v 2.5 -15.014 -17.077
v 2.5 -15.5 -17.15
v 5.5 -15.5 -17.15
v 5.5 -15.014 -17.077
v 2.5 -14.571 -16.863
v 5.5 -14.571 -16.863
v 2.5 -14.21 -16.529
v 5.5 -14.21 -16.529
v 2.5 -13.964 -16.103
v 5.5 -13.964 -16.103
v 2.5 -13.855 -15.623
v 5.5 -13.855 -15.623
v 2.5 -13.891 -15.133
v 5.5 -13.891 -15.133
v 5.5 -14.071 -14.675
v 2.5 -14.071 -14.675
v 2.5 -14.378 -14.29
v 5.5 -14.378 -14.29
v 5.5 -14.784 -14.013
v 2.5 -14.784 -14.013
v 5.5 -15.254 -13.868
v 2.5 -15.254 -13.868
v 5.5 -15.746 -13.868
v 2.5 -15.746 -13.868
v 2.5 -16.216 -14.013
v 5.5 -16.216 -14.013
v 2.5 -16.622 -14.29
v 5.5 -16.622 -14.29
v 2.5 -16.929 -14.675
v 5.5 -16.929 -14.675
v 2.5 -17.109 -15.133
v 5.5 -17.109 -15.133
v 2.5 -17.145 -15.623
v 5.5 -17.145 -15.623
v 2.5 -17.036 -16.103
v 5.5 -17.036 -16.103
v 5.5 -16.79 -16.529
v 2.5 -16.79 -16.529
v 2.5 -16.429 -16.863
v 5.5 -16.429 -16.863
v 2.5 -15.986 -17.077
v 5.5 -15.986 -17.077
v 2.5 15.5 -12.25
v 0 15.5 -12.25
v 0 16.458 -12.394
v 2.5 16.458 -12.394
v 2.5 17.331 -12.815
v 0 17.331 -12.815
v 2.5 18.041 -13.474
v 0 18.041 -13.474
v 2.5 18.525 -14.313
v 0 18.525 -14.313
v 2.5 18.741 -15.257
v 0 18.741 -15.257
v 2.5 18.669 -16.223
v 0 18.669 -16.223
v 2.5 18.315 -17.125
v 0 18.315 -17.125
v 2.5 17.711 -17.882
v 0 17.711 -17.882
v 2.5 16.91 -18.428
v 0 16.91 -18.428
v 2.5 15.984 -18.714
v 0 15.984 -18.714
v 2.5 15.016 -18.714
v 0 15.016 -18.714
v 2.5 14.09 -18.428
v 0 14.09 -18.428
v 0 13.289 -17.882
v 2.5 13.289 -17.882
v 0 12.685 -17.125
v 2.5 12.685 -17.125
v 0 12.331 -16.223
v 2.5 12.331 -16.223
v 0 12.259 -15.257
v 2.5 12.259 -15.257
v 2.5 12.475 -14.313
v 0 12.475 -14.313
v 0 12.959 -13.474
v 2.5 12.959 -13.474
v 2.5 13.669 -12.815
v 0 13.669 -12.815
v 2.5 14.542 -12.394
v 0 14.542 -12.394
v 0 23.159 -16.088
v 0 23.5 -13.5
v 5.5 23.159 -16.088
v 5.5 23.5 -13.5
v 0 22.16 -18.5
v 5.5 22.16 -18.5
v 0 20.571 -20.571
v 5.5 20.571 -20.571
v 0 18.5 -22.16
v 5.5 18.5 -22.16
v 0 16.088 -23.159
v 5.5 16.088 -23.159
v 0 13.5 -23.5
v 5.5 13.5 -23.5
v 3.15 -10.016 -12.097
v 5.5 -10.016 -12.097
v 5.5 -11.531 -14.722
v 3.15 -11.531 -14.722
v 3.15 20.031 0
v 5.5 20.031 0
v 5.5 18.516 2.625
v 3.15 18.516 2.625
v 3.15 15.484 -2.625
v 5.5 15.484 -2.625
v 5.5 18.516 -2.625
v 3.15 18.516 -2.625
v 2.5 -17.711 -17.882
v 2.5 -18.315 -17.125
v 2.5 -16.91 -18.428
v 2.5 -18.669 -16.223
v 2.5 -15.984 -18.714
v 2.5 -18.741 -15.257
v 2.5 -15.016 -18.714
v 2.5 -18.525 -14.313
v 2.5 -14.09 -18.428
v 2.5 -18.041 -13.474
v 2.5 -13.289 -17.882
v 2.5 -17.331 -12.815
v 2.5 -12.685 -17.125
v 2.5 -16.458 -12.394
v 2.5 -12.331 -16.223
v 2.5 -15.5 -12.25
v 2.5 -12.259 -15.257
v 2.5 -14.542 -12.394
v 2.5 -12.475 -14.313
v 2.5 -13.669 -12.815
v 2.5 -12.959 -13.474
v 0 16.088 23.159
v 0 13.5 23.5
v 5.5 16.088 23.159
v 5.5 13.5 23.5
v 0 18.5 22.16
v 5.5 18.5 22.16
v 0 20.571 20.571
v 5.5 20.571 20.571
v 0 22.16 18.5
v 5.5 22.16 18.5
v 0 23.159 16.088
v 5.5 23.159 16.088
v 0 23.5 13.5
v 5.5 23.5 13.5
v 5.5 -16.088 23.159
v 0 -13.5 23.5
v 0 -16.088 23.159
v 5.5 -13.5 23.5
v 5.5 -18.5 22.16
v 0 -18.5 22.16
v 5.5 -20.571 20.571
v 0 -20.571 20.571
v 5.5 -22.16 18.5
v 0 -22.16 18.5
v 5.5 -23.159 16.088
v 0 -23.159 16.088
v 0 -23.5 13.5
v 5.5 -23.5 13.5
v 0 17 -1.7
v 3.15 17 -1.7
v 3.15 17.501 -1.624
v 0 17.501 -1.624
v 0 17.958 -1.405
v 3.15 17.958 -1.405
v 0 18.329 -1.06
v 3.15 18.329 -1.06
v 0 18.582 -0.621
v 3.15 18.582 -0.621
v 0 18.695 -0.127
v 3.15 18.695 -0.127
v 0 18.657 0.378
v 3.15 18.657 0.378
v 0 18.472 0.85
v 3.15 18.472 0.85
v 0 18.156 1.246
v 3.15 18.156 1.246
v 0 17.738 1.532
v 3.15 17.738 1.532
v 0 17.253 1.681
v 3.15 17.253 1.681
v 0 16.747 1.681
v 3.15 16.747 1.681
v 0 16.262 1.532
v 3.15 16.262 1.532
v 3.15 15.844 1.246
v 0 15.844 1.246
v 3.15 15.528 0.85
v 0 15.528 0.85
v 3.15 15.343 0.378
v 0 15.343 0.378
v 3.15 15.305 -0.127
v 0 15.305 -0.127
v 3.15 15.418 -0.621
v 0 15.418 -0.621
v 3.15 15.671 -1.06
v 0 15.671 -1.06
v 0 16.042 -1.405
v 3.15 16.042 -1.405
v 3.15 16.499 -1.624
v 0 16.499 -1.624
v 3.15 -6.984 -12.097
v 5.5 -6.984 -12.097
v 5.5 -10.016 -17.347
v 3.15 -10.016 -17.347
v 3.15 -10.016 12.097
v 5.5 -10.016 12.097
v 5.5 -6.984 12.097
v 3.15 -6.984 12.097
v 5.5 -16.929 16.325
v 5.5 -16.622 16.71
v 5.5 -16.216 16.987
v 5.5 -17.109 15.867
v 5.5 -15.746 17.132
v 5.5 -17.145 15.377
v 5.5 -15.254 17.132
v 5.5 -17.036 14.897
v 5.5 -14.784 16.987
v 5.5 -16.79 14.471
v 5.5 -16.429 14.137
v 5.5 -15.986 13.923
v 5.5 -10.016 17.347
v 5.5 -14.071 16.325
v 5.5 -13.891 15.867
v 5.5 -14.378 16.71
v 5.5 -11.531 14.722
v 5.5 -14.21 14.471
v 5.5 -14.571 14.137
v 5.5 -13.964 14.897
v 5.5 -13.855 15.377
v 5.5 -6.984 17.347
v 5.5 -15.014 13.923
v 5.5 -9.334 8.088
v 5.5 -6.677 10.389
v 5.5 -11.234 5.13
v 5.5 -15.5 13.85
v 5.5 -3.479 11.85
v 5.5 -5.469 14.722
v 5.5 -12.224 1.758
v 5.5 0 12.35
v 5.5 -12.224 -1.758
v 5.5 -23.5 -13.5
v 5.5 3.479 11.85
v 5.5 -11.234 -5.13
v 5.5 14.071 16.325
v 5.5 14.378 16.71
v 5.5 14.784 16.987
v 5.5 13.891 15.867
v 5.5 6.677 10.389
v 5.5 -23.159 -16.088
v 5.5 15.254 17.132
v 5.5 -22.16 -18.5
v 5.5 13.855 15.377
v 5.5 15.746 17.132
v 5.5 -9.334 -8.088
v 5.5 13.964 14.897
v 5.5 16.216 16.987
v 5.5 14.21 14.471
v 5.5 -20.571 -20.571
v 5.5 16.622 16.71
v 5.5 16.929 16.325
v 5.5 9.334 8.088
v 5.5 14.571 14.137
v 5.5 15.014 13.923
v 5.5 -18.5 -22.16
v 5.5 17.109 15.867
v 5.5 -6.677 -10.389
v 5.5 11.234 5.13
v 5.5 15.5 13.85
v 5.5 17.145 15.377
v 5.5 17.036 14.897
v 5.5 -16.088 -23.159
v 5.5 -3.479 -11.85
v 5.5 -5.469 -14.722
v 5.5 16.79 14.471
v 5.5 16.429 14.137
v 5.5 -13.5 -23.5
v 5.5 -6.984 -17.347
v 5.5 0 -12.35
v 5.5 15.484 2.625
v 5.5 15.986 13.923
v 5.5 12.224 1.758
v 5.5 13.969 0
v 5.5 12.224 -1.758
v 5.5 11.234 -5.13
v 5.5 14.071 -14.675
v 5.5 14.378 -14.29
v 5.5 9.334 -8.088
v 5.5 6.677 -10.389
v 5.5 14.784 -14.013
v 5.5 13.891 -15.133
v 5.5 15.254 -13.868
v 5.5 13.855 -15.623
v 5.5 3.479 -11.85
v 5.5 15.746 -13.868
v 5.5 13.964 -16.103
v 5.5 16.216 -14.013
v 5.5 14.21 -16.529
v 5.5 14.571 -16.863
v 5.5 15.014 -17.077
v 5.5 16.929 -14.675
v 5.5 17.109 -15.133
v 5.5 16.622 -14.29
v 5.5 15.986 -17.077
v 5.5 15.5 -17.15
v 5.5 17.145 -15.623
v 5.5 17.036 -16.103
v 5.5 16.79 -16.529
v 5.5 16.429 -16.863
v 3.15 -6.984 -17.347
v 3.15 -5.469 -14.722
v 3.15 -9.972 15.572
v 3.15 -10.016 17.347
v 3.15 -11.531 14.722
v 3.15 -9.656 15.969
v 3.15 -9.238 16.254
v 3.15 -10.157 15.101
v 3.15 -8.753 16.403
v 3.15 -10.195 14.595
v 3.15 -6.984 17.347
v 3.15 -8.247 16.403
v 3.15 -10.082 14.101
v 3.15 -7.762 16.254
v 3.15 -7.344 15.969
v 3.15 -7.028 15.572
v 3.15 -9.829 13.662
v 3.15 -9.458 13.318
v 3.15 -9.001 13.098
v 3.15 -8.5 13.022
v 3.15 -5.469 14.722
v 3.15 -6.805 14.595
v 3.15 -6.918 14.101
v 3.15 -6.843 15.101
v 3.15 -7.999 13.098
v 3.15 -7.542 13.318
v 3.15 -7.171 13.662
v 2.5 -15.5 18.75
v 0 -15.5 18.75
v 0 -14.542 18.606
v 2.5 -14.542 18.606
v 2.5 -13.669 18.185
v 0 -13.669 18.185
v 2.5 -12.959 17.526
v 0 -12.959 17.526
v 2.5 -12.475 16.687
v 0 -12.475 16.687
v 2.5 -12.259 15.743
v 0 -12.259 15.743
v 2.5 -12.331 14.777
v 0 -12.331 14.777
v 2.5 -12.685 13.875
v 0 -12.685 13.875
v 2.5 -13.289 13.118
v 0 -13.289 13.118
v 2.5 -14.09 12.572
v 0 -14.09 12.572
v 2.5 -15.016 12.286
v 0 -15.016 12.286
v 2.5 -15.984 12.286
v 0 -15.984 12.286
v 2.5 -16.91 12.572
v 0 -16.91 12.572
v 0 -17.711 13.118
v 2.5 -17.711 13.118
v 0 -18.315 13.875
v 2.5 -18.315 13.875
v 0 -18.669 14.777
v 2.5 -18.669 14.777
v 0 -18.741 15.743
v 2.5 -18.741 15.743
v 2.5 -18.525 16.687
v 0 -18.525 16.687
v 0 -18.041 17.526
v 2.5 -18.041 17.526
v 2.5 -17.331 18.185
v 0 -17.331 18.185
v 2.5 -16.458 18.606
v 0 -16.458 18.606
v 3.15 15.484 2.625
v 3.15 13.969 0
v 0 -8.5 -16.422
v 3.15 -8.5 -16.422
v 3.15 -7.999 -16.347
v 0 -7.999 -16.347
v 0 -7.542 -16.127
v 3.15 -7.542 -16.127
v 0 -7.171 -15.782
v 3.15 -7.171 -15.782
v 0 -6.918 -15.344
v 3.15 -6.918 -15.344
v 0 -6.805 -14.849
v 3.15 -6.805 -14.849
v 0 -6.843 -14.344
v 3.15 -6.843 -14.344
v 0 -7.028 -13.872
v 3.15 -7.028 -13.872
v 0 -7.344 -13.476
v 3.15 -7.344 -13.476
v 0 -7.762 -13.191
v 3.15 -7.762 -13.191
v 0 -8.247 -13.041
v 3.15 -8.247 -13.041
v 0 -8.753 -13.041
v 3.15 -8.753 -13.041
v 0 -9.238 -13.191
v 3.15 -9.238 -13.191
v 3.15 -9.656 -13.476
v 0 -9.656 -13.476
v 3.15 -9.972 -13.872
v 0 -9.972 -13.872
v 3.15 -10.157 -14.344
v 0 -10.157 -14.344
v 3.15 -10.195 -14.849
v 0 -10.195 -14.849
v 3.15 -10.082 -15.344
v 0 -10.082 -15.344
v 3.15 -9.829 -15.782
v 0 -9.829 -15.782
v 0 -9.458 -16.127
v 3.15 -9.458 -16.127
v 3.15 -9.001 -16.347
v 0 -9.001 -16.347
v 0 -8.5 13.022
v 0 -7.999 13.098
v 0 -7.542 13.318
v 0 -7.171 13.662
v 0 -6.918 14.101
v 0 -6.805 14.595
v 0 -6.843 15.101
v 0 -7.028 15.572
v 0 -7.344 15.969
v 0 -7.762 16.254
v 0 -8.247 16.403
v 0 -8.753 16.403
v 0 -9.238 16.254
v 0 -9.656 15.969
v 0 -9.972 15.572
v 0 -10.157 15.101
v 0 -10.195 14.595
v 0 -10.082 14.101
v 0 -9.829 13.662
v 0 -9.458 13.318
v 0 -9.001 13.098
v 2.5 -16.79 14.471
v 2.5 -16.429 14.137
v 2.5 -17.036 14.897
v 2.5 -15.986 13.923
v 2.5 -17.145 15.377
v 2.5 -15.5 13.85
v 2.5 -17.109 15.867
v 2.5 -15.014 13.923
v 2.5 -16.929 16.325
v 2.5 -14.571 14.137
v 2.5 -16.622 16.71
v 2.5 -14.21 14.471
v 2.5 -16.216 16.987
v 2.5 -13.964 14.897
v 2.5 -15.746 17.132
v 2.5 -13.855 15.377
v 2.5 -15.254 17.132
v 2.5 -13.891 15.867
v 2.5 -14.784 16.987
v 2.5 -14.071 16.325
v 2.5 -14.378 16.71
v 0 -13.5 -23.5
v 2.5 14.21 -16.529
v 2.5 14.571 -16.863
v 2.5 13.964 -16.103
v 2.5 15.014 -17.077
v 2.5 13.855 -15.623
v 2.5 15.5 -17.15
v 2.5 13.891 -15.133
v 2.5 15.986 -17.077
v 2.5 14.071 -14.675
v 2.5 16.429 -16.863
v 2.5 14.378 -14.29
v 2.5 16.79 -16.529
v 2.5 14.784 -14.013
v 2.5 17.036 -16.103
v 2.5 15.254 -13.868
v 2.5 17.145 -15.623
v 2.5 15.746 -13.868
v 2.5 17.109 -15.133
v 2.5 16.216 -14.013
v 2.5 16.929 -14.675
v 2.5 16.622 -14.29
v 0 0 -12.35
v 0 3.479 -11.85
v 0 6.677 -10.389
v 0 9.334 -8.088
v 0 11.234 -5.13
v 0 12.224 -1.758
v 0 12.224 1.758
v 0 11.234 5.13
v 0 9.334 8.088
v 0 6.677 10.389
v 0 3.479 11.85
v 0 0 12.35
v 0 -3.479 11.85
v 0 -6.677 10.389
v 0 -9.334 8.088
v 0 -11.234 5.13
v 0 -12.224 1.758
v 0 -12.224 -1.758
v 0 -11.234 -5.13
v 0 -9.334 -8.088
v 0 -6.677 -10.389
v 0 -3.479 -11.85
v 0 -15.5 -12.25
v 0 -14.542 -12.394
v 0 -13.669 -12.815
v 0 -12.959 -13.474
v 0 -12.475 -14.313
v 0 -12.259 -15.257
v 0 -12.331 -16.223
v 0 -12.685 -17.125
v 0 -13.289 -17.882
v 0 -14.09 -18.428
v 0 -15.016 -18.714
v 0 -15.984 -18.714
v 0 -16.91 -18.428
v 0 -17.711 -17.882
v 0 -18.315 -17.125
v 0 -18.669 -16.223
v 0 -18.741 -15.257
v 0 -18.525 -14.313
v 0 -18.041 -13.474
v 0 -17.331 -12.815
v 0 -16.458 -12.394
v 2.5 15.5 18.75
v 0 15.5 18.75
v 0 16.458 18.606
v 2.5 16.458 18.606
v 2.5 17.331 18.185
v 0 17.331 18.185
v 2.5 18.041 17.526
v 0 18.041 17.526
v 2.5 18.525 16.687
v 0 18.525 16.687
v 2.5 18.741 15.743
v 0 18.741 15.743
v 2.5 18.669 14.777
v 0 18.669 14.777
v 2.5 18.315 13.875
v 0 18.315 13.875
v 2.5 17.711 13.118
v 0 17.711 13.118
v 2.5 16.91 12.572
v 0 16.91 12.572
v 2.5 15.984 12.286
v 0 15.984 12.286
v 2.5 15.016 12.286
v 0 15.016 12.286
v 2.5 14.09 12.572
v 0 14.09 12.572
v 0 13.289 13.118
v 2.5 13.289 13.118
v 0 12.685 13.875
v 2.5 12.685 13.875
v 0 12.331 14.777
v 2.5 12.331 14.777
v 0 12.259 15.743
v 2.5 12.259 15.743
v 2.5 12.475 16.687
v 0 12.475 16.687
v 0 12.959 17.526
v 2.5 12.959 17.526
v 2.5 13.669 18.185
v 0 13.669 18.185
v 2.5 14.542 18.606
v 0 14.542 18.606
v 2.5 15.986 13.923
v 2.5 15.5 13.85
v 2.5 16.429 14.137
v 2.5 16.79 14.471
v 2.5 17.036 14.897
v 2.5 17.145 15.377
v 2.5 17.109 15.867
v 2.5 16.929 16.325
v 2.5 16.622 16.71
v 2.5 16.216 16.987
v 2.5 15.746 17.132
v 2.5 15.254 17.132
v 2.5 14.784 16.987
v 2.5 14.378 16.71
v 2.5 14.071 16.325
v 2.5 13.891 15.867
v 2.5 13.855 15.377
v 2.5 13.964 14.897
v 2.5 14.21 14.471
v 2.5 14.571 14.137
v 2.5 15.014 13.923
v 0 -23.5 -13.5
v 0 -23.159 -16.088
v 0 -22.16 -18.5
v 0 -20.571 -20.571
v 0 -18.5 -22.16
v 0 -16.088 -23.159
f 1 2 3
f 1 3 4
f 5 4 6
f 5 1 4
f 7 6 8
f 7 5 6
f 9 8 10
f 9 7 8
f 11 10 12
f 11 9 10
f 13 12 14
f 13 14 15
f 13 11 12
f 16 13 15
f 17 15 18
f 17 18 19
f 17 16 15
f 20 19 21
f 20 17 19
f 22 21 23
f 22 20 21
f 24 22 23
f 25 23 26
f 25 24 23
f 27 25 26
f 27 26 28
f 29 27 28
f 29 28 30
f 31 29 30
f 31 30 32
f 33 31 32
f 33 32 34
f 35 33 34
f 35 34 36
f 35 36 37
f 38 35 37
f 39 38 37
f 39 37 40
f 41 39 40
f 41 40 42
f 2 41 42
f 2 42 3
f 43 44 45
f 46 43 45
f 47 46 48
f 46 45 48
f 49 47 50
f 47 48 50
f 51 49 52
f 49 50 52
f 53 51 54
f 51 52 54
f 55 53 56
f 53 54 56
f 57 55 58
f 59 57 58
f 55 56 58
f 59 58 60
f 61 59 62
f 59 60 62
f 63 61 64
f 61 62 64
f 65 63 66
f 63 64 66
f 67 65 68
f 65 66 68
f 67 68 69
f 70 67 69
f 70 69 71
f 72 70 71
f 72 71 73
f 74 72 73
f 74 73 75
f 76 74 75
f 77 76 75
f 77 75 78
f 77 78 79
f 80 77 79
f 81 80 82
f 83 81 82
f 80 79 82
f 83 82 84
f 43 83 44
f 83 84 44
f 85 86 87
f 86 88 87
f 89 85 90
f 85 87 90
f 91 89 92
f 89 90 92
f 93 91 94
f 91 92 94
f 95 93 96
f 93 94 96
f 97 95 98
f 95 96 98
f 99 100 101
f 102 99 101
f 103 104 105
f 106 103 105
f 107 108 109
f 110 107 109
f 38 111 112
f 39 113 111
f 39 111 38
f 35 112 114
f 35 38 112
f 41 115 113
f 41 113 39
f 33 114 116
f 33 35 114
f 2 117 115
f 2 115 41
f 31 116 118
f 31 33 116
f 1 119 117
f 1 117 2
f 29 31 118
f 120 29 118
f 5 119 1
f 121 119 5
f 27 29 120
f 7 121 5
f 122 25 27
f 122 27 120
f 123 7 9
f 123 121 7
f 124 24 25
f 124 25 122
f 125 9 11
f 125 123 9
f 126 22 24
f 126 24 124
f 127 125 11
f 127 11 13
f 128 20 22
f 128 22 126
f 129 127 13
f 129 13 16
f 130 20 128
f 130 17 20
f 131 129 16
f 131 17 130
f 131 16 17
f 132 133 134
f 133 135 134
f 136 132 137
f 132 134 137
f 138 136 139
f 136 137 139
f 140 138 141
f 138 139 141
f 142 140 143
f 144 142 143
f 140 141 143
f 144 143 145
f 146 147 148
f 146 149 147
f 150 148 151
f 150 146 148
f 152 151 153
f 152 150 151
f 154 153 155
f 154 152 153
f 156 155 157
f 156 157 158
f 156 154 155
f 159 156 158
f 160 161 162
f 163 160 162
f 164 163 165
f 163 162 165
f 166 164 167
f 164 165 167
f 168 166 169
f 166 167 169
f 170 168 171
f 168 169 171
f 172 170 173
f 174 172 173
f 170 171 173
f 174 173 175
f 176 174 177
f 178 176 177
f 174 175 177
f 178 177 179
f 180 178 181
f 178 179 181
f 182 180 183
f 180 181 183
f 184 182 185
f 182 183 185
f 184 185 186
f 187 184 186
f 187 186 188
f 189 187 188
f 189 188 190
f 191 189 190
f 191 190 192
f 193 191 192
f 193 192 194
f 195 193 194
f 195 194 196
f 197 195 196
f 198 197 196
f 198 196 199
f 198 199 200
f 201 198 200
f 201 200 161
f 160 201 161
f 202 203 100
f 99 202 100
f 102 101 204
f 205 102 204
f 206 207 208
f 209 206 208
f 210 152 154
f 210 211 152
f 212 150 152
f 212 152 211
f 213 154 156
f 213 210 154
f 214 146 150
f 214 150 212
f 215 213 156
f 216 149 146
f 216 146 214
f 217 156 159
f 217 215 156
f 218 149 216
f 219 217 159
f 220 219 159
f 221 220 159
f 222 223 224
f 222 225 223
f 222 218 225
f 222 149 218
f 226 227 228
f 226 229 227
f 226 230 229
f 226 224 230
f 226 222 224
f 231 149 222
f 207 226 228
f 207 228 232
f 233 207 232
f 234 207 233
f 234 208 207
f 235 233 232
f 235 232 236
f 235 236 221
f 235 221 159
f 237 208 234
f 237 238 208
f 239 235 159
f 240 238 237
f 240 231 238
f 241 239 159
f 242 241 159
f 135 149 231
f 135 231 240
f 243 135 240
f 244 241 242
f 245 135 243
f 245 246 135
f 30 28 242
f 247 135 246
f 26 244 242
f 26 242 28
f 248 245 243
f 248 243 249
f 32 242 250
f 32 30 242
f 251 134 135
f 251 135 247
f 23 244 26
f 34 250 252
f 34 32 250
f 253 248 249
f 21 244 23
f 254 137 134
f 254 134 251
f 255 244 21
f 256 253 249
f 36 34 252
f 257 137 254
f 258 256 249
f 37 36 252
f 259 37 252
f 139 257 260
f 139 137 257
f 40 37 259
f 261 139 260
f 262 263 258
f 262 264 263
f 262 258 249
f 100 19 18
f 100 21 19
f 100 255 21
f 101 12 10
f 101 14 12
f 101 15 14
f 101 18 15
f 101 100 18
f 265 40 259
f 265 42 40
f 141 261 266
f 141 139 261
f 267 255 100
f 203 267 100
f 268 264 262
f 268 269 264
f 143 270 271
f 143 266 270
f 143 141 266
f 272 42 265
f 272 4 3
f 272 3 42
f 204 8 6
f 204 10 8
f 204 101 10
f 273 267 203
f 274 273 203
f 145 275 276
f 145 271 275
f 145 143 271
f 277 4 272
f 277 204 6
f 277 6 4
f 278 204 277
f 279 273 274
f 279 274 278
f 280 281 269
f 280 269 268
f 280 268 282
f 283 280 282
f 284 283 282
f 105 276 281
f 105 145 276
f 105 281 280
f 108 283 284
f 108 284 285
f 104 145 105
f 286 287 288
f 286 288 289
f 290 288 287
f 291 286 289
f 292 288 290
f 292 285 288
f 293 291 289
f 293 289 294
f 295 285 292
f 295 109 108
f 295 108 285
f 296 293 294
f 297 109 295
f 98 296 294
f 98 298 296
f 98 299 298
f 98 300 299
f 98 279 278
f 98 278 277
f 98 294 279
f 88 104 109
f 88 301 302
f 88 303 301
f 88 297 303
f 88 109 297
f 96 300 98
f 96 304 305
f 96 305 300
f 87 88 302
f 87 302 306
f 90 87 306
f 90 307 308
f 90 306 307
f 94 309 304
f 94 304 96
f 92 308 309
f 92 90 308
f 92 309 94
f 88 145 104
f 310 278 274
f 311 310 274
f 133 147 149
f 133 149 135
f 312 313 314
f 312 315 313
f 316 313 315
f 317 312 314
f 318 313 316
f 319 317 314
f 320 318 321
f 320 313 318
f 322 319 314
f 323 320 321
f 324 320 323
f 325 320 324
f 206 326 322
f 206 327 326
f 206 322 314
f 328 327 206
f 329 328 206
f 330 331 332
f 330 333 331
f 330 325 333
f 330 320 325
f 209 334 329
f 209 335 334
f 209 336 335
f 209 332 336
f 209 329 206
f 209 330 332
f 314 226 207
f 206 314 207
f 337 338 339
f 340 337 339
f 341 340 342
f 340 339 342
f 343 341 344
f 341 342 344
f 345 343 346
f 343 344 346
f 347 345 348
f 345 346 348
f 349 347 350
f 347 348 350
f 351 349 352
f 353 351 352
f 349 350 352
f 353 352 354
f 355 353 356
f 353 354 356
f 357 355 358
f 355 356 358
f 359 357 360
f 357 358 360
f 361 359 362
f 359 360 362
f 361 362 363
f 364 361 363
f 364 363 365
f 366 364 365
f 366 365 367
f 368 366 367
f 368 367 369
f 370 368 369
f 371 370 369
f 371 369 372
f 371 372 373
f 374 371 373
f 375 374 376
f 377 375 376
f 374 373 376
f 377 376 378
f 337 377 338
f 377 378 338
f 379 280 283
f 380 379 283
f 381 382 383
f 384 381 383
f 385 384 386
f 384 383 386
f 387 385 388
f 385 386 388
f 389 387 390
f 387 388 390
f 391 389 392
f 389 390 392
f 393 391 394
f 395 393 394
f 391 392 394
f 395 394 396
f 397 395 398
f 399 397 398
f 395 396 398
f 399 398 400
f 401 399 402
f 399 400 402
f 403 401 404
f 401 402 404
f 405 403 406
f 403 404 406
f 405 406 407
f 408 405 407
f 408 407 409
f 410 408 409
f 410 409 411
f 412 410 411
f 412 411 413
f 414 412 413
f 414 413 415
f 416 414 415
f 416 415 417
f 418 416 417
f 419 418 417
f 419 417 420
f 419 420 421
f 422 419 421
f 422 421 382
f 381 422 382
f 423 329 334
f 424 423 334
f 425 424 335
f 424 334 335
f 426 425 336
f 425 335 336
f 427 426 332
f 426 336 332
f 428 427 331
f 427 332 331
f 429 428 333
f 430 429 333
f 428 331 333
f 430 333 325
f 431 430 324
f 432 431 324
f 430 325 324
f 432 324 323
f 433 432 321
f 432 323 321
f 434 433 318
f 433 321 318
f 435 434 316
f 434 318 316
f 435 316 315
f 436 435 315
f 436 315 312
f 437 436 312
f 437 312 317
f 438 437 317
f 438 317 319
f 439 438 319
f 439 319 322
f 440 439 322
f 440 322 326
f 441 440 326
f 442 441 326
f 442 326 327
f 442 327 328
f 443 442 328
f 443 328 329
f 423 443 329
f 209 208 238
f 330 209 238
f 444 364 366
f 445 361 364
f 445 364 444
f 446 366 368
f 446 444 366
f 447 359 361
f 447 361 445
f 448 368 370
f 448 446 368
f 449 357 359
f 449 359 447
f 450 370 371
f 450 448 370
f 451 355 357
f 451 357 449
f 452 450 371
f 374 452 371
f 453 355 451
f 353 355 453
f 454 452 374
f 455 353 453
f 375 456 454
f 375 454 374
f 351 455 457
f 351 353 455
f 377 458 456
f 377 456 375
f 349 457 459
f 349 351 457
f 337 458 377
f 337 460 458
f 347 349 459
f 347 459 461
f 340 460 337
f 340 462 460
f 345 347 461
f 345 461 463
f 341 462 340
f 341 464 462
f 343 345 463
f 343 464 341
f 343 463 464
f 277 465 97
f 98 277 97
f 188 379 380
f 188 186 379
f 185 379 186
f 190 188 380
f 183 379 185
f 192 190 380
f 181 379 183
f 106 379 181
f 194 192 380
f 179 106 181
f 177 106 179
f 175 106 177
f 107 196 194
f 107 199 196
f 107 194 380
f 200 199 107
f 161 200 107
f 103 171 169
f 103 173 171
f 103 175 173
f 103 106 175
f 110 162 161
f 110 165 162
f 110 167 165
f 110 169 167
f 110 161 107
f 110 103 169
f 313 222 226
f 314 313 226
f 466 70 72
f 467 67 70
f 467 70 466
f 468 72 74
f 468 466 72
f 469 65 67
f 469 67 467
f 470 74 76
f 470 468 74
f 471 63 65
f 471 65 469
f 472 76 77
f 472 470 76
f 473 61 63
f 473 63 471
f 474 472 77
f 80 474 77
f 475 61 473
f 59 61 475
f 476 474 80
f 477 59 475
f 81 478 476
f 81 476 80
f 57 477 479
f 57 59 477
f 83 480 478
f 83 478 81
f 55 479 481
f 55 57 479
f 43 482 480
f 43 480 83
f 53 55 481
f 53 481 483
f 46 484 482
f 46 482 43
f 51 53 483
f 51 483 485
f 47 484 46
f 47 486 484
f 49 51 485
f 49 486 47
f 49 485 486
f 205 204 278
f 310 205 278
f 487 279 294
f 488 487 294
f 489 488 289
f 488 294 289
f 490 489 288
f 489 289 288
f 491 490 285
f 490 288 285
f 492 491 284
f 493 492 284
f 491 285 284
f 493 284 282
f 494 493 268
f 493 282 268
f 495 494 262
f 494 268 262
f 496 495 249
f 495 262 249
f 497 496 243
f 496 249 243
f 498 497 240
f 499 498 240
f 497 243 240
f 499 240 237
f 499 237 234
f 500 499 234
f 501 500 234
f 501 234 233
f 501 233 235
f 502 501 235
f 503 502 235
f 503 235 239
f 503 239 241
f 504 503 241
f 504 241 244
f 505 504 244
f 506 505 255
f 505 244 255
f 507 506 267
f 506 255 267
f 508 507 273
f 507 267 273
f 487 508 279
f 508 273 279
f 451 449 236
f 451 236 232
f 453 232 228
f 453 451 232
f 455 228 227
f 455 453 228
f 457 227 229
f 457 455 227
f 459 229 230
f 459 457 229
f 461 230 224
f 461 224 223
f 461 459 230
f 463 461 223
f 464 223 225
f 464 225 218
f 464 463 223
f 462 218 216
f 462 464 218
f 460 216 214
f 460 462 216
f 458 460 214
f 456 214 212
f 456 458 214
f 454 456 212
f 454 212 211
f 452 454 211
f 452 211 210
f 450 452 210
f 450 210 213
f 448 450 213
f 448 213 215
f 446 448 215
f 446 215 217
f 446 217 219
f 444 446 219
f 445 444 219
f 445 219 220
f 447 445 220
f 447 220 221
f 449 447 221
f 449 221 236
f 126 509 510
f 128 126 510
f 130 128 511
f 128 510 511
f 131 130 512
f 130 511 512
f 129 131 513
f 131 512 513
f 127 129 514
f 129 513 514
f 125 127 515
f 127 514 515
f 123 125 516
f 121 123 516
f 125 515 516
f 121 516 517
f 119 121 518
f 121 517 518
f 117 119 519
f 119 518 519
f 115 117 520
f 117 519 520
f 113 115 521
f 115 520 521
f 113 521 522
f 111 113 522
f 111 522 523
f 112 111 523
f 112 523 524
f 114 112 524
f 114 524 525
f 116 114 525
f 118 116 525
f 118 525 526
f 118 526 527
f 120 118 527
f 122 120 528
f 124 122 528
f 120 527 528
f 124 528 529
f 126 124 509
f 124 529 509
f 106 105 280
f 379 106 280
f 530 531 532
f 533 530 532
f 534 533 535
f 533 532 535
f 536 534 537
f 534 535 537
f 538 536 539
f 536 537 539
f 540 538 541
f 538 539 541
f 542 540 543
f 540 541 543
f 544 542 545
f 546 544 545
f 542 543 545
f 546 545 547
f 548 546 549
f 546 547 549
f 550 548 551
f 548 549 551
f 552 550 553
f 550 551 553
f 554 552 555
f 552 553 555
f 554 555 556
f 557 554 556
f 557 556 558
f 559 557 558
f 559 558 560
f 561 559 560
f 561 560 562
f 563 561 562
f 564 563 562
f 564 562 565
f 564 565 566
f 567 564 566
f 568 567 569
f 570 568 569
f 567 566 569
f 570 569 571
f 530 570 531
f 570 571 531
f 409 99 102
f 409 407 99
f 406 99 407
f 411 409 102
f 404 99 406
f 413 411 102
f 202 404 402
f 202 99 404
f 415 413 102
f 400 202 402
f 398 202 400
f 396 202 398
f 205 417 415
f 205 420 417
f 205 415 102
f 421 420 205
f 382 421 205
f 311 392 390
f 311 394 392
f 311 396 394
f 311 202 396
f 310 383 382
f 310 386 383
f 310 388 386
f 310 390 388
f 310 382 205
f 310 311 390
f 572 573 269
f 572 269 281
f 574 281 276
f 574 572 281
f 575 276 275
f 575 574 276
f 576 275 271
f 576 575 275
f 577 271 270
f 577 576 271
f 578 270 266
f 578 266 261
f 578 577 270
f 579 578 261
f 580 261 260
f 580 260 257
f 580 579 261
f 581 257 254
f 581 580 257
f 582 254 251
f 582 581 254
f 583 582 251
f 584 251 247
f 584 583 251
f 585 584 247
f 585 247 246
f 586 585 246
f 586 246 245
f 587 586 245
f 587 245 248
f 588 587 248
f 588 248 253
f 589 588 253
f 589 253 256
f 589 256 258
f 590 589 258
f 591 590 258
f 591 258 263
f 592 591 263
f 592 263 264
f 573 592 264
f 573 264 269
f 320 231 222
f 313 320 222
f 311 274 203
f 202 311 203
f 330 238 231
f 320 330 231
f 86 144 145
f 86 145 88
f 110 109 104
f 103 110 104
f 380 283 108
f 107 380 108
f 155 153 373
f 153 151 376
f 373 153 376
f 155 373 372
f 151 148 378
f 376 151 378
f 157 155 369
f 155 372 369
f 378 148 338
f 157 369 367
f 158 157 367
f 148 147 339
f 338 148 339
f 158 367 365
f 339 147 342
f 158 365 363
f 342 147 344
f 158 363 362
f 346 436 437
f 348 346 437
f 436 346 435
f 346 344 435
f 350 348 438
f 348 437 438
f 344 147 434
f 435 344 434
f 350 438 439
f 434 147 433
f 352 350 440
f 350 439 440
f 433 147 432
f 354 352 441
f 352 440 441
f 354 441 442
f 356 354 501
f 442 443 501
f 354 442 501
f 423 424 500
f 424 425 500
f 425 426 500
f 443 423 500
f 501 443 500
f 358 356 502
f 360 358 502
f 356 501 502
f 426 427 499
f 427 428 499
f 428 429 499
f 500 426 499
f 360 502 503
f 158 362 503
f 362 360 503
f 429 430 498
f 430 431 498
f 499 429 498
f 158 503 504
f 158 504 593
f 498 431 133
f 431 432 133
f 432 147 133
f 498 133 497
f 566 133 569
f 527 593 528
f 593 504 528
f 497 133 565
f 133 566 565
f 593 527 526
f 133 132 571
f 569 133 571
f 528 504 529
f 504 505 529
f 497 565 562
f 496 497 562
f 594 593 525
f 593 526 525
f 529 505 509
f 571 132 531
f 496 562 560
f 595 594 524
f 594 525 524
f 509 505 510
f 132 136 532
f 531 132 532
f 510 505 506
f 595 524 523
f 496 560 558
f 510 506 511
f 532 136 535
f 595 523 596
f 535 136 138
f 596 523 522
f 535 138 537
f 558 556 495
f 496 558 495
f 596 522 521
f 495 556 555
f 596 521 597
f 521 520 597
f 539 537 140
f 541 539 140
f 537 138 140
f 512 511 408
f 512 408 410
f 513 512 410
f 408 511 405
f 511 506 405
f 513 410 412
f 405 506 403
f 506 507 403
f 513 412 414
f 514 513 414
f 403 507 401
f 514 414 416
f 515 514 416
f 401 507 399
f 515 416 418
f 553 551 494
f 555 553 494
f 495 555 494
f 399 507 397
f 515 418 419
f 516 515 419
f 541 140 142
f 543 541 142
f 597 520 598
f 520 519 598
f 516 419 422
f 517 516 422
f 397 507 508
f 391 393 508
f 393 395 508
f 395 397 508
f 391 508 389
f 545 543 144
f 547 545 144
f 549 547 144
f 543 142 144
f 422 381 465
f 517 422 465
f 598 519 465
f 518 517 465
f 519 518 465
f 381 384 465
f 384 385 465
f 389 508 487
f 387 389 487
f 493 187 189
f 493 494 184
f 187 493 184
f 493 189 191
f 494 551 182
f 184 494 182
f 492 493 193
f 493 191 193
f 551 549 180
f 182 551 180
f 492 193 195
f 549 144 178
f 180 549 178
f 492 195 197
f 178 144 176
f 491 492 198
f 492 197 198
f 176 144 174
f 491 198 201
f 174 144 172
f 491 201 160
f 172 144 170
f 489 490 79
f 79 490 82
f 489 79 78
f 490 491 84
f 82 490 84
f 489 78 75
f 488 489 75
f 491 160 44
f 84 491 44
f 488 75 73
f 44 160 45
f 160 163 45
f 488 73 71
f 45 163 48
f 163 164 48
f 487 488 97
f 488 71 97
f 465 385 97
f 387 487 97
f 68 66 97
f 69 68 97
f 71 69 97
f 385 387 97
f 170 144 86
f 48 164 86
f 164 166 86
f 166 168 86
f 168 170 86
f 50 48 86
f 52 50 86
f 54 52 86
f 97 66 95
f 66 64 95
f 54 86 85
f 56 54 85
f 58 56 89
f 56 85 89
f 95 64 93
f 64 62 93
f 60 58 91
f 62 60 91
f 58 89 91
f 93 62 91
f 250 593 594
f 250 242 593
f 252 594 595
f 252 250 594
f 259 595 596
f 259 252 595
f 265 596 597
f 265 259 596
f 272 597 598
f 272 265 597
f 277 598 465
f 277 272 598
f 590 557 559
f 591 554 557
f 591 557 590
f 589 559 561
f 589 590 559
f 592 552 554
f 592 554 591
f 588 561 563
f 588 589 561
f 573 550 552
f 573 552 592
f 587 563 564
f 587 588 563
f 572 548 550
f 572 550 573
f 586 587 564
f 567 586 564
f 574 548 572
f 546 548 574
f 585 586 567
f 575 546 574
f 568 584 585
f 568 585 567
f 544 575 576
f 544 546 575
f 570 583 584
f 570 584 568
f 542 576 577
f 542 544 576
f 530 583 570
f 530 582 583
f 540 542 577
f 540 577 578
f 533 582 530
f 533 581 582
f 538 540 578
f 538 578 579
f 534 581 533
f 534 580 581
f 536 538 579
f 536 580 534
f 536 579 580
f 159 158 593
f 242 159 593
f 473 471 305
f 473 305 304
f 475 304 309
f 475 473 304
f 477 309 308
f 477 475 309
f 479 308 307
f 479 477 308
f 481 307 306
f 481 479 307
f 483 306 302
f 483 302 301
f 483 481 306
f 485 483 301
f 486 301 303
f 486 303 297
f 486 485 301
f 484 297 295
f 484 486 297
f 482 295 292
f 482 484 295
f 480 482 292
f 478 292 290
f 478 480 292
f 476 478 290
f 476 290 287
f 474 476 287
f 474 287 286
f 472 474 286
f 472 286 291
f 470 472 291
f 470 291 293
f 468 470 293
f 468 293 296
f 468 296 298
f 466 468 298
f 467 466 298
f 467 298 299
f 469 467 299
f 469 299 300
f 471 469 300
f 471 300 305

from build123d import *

# Parameters (mm, degrees)
CROQUIS1_W              = 47
CROQUIS1_H              = 47
CROQUIS1_R              = 1.65
SALIENTE_EXTRUIR1_DEPTH = 5.5
CORTAR_EXTRUIR1_DEPTH   = 2.35
CROQUIS7_R              = 12.35
CORTAR_EXTRUIR2_DEPTH   = 5.5
CROQUIS8_R              = 1.7
CORTAR_EXTRUIR3_DEPTH   = 5.5
CROQUIS9_R              = 3.25
CORTAR_EXTRUIR4_DEPTH   = 2.5
REDONDEO1_R             = 10


with BuildPart() as part:
    # Croquis1 → Saliente-Extruir1 (new body)
    with BuildSketch(Plane(origin=(0, 0, 0), x_dir=(0, 0, -1), z_dir=(1, 0, 0))):
        Rectangle(CROQUIS1_W, CROQUIS1_H)
        with Locations((-15.5, 15.5)):
            Circle(CROQUIS1_R, mode=Mode.SUBTRACT)
        with Locations((15.5, 15.5)):
            Circle(CROQUIS1_R, mode=Mode.SUBTRACT)
        with Locations((15.5, -15.5)):
            Circle(CROQUIS1_R, mode=Mode.SUBTRACT)
        with Locations((-15.5, -15.5)):
            Circle(CROQUIS1_R, mode=Mode.SUBTRACT)
    extrude(amount=SALIENTE_EXTRUIR1_DEPTH)

    # Croquis2 → Cortar-Extruir1 (cut)
    with BuildSketch(Plane(origin=(5.5, 0, 0), x_dir=(0, 0, -1), z_dir=(1, 0, 0))):
        Polygon((0, 13.968911087), (2.625, 15.484455543), (2.625, 18.515544457), (0, 20.031088913), (-2.625, 18.515544457), (-2.625, 15.484455543), align=None)
        Polygon((14.722431864, -11.531088913), (17.347431864, -10.015544457), (17.347431864, -6.984455543), (14.722431864, -5.468911087), (12.097431864, -6.984455543), (12.097431864, -10.015544457), align=None)
        Polygon((-17.347431864, -6.984455543), (-17.347431864, -10.015544457), (-14.722431864, -11.531088913), (-12.097431864, -10.015544457), (-12.097431864, -6.984455543), (-14.722431864, -5.468911087), align=None)
    extrude(amount=-CORTAR_EXTRUIR1_DEPTH, mode=Mode.SUBTRACT)

    # Croquis7 → Cortar-Extruir2 (cut)
    with BuildSketch(Plane(origin=(5.5, 0, 0), x_dir=(0, 0, -1), z_dir=(1, 0, 0))):
        Circle(CROQUIS7_R)
    extrude(amount=-CORTAR_EXTRUIR2_DEPTH, mode=Mode.SUBTRACT)

    # Croquis8 → Cortar-Extruir3 (cut)
    with BuildSketch(Plane(origin=(5.5, 0, 0), x_dir=(0, 0, -1), z_dir=(1, 0, 0))):
        with Locations((0, 17)):
            Circle(CROQUIS8_R)
        with Locations((14.722431864, -8.5)):
            Circle(CROQUIS8_R)
        with Locations((-14.722431864, -8.5)):
            Circle(CROQUIS8_R)
    extrude(amount=-CORTAR_EXTRUIR3_DEPTH, mode=Mode.SUBTRACT)

    # Croquis9 → Cortar-Extruir4 (cut)
    with BuildSketch(Plane.ZY):
        with Locations((-15.5, -15.5)):
            Circle(CROQUIS9_R)
        with Locations((-15.5, 15.5)):
            Circle(CROQUIS9_R)
        with Locations((15.5, 15.5)):
            Circle(CROQUIS9_R)
        with Locations((15.5, -15.5)):
            Circle(CROQUIS9_R)
    extrude(amount=-CORTAR_EXTRUIR4_DEPTH, mode=Mode.SUBTRACT)

    # Redondeo1
    redondeo1_edges = [part.edges().sort_by_distance(p)[0] for p in [
        (2.75, -23.5, 23.5),
        (2.75, 23.5, 23.5),
        (2.75, 23.5, -23.5),
        (2.75, -23.5, -23.5),
    ]]
    fillet(redondeo1_edges, radius=REDONDEO1_R)


solid = part.part
